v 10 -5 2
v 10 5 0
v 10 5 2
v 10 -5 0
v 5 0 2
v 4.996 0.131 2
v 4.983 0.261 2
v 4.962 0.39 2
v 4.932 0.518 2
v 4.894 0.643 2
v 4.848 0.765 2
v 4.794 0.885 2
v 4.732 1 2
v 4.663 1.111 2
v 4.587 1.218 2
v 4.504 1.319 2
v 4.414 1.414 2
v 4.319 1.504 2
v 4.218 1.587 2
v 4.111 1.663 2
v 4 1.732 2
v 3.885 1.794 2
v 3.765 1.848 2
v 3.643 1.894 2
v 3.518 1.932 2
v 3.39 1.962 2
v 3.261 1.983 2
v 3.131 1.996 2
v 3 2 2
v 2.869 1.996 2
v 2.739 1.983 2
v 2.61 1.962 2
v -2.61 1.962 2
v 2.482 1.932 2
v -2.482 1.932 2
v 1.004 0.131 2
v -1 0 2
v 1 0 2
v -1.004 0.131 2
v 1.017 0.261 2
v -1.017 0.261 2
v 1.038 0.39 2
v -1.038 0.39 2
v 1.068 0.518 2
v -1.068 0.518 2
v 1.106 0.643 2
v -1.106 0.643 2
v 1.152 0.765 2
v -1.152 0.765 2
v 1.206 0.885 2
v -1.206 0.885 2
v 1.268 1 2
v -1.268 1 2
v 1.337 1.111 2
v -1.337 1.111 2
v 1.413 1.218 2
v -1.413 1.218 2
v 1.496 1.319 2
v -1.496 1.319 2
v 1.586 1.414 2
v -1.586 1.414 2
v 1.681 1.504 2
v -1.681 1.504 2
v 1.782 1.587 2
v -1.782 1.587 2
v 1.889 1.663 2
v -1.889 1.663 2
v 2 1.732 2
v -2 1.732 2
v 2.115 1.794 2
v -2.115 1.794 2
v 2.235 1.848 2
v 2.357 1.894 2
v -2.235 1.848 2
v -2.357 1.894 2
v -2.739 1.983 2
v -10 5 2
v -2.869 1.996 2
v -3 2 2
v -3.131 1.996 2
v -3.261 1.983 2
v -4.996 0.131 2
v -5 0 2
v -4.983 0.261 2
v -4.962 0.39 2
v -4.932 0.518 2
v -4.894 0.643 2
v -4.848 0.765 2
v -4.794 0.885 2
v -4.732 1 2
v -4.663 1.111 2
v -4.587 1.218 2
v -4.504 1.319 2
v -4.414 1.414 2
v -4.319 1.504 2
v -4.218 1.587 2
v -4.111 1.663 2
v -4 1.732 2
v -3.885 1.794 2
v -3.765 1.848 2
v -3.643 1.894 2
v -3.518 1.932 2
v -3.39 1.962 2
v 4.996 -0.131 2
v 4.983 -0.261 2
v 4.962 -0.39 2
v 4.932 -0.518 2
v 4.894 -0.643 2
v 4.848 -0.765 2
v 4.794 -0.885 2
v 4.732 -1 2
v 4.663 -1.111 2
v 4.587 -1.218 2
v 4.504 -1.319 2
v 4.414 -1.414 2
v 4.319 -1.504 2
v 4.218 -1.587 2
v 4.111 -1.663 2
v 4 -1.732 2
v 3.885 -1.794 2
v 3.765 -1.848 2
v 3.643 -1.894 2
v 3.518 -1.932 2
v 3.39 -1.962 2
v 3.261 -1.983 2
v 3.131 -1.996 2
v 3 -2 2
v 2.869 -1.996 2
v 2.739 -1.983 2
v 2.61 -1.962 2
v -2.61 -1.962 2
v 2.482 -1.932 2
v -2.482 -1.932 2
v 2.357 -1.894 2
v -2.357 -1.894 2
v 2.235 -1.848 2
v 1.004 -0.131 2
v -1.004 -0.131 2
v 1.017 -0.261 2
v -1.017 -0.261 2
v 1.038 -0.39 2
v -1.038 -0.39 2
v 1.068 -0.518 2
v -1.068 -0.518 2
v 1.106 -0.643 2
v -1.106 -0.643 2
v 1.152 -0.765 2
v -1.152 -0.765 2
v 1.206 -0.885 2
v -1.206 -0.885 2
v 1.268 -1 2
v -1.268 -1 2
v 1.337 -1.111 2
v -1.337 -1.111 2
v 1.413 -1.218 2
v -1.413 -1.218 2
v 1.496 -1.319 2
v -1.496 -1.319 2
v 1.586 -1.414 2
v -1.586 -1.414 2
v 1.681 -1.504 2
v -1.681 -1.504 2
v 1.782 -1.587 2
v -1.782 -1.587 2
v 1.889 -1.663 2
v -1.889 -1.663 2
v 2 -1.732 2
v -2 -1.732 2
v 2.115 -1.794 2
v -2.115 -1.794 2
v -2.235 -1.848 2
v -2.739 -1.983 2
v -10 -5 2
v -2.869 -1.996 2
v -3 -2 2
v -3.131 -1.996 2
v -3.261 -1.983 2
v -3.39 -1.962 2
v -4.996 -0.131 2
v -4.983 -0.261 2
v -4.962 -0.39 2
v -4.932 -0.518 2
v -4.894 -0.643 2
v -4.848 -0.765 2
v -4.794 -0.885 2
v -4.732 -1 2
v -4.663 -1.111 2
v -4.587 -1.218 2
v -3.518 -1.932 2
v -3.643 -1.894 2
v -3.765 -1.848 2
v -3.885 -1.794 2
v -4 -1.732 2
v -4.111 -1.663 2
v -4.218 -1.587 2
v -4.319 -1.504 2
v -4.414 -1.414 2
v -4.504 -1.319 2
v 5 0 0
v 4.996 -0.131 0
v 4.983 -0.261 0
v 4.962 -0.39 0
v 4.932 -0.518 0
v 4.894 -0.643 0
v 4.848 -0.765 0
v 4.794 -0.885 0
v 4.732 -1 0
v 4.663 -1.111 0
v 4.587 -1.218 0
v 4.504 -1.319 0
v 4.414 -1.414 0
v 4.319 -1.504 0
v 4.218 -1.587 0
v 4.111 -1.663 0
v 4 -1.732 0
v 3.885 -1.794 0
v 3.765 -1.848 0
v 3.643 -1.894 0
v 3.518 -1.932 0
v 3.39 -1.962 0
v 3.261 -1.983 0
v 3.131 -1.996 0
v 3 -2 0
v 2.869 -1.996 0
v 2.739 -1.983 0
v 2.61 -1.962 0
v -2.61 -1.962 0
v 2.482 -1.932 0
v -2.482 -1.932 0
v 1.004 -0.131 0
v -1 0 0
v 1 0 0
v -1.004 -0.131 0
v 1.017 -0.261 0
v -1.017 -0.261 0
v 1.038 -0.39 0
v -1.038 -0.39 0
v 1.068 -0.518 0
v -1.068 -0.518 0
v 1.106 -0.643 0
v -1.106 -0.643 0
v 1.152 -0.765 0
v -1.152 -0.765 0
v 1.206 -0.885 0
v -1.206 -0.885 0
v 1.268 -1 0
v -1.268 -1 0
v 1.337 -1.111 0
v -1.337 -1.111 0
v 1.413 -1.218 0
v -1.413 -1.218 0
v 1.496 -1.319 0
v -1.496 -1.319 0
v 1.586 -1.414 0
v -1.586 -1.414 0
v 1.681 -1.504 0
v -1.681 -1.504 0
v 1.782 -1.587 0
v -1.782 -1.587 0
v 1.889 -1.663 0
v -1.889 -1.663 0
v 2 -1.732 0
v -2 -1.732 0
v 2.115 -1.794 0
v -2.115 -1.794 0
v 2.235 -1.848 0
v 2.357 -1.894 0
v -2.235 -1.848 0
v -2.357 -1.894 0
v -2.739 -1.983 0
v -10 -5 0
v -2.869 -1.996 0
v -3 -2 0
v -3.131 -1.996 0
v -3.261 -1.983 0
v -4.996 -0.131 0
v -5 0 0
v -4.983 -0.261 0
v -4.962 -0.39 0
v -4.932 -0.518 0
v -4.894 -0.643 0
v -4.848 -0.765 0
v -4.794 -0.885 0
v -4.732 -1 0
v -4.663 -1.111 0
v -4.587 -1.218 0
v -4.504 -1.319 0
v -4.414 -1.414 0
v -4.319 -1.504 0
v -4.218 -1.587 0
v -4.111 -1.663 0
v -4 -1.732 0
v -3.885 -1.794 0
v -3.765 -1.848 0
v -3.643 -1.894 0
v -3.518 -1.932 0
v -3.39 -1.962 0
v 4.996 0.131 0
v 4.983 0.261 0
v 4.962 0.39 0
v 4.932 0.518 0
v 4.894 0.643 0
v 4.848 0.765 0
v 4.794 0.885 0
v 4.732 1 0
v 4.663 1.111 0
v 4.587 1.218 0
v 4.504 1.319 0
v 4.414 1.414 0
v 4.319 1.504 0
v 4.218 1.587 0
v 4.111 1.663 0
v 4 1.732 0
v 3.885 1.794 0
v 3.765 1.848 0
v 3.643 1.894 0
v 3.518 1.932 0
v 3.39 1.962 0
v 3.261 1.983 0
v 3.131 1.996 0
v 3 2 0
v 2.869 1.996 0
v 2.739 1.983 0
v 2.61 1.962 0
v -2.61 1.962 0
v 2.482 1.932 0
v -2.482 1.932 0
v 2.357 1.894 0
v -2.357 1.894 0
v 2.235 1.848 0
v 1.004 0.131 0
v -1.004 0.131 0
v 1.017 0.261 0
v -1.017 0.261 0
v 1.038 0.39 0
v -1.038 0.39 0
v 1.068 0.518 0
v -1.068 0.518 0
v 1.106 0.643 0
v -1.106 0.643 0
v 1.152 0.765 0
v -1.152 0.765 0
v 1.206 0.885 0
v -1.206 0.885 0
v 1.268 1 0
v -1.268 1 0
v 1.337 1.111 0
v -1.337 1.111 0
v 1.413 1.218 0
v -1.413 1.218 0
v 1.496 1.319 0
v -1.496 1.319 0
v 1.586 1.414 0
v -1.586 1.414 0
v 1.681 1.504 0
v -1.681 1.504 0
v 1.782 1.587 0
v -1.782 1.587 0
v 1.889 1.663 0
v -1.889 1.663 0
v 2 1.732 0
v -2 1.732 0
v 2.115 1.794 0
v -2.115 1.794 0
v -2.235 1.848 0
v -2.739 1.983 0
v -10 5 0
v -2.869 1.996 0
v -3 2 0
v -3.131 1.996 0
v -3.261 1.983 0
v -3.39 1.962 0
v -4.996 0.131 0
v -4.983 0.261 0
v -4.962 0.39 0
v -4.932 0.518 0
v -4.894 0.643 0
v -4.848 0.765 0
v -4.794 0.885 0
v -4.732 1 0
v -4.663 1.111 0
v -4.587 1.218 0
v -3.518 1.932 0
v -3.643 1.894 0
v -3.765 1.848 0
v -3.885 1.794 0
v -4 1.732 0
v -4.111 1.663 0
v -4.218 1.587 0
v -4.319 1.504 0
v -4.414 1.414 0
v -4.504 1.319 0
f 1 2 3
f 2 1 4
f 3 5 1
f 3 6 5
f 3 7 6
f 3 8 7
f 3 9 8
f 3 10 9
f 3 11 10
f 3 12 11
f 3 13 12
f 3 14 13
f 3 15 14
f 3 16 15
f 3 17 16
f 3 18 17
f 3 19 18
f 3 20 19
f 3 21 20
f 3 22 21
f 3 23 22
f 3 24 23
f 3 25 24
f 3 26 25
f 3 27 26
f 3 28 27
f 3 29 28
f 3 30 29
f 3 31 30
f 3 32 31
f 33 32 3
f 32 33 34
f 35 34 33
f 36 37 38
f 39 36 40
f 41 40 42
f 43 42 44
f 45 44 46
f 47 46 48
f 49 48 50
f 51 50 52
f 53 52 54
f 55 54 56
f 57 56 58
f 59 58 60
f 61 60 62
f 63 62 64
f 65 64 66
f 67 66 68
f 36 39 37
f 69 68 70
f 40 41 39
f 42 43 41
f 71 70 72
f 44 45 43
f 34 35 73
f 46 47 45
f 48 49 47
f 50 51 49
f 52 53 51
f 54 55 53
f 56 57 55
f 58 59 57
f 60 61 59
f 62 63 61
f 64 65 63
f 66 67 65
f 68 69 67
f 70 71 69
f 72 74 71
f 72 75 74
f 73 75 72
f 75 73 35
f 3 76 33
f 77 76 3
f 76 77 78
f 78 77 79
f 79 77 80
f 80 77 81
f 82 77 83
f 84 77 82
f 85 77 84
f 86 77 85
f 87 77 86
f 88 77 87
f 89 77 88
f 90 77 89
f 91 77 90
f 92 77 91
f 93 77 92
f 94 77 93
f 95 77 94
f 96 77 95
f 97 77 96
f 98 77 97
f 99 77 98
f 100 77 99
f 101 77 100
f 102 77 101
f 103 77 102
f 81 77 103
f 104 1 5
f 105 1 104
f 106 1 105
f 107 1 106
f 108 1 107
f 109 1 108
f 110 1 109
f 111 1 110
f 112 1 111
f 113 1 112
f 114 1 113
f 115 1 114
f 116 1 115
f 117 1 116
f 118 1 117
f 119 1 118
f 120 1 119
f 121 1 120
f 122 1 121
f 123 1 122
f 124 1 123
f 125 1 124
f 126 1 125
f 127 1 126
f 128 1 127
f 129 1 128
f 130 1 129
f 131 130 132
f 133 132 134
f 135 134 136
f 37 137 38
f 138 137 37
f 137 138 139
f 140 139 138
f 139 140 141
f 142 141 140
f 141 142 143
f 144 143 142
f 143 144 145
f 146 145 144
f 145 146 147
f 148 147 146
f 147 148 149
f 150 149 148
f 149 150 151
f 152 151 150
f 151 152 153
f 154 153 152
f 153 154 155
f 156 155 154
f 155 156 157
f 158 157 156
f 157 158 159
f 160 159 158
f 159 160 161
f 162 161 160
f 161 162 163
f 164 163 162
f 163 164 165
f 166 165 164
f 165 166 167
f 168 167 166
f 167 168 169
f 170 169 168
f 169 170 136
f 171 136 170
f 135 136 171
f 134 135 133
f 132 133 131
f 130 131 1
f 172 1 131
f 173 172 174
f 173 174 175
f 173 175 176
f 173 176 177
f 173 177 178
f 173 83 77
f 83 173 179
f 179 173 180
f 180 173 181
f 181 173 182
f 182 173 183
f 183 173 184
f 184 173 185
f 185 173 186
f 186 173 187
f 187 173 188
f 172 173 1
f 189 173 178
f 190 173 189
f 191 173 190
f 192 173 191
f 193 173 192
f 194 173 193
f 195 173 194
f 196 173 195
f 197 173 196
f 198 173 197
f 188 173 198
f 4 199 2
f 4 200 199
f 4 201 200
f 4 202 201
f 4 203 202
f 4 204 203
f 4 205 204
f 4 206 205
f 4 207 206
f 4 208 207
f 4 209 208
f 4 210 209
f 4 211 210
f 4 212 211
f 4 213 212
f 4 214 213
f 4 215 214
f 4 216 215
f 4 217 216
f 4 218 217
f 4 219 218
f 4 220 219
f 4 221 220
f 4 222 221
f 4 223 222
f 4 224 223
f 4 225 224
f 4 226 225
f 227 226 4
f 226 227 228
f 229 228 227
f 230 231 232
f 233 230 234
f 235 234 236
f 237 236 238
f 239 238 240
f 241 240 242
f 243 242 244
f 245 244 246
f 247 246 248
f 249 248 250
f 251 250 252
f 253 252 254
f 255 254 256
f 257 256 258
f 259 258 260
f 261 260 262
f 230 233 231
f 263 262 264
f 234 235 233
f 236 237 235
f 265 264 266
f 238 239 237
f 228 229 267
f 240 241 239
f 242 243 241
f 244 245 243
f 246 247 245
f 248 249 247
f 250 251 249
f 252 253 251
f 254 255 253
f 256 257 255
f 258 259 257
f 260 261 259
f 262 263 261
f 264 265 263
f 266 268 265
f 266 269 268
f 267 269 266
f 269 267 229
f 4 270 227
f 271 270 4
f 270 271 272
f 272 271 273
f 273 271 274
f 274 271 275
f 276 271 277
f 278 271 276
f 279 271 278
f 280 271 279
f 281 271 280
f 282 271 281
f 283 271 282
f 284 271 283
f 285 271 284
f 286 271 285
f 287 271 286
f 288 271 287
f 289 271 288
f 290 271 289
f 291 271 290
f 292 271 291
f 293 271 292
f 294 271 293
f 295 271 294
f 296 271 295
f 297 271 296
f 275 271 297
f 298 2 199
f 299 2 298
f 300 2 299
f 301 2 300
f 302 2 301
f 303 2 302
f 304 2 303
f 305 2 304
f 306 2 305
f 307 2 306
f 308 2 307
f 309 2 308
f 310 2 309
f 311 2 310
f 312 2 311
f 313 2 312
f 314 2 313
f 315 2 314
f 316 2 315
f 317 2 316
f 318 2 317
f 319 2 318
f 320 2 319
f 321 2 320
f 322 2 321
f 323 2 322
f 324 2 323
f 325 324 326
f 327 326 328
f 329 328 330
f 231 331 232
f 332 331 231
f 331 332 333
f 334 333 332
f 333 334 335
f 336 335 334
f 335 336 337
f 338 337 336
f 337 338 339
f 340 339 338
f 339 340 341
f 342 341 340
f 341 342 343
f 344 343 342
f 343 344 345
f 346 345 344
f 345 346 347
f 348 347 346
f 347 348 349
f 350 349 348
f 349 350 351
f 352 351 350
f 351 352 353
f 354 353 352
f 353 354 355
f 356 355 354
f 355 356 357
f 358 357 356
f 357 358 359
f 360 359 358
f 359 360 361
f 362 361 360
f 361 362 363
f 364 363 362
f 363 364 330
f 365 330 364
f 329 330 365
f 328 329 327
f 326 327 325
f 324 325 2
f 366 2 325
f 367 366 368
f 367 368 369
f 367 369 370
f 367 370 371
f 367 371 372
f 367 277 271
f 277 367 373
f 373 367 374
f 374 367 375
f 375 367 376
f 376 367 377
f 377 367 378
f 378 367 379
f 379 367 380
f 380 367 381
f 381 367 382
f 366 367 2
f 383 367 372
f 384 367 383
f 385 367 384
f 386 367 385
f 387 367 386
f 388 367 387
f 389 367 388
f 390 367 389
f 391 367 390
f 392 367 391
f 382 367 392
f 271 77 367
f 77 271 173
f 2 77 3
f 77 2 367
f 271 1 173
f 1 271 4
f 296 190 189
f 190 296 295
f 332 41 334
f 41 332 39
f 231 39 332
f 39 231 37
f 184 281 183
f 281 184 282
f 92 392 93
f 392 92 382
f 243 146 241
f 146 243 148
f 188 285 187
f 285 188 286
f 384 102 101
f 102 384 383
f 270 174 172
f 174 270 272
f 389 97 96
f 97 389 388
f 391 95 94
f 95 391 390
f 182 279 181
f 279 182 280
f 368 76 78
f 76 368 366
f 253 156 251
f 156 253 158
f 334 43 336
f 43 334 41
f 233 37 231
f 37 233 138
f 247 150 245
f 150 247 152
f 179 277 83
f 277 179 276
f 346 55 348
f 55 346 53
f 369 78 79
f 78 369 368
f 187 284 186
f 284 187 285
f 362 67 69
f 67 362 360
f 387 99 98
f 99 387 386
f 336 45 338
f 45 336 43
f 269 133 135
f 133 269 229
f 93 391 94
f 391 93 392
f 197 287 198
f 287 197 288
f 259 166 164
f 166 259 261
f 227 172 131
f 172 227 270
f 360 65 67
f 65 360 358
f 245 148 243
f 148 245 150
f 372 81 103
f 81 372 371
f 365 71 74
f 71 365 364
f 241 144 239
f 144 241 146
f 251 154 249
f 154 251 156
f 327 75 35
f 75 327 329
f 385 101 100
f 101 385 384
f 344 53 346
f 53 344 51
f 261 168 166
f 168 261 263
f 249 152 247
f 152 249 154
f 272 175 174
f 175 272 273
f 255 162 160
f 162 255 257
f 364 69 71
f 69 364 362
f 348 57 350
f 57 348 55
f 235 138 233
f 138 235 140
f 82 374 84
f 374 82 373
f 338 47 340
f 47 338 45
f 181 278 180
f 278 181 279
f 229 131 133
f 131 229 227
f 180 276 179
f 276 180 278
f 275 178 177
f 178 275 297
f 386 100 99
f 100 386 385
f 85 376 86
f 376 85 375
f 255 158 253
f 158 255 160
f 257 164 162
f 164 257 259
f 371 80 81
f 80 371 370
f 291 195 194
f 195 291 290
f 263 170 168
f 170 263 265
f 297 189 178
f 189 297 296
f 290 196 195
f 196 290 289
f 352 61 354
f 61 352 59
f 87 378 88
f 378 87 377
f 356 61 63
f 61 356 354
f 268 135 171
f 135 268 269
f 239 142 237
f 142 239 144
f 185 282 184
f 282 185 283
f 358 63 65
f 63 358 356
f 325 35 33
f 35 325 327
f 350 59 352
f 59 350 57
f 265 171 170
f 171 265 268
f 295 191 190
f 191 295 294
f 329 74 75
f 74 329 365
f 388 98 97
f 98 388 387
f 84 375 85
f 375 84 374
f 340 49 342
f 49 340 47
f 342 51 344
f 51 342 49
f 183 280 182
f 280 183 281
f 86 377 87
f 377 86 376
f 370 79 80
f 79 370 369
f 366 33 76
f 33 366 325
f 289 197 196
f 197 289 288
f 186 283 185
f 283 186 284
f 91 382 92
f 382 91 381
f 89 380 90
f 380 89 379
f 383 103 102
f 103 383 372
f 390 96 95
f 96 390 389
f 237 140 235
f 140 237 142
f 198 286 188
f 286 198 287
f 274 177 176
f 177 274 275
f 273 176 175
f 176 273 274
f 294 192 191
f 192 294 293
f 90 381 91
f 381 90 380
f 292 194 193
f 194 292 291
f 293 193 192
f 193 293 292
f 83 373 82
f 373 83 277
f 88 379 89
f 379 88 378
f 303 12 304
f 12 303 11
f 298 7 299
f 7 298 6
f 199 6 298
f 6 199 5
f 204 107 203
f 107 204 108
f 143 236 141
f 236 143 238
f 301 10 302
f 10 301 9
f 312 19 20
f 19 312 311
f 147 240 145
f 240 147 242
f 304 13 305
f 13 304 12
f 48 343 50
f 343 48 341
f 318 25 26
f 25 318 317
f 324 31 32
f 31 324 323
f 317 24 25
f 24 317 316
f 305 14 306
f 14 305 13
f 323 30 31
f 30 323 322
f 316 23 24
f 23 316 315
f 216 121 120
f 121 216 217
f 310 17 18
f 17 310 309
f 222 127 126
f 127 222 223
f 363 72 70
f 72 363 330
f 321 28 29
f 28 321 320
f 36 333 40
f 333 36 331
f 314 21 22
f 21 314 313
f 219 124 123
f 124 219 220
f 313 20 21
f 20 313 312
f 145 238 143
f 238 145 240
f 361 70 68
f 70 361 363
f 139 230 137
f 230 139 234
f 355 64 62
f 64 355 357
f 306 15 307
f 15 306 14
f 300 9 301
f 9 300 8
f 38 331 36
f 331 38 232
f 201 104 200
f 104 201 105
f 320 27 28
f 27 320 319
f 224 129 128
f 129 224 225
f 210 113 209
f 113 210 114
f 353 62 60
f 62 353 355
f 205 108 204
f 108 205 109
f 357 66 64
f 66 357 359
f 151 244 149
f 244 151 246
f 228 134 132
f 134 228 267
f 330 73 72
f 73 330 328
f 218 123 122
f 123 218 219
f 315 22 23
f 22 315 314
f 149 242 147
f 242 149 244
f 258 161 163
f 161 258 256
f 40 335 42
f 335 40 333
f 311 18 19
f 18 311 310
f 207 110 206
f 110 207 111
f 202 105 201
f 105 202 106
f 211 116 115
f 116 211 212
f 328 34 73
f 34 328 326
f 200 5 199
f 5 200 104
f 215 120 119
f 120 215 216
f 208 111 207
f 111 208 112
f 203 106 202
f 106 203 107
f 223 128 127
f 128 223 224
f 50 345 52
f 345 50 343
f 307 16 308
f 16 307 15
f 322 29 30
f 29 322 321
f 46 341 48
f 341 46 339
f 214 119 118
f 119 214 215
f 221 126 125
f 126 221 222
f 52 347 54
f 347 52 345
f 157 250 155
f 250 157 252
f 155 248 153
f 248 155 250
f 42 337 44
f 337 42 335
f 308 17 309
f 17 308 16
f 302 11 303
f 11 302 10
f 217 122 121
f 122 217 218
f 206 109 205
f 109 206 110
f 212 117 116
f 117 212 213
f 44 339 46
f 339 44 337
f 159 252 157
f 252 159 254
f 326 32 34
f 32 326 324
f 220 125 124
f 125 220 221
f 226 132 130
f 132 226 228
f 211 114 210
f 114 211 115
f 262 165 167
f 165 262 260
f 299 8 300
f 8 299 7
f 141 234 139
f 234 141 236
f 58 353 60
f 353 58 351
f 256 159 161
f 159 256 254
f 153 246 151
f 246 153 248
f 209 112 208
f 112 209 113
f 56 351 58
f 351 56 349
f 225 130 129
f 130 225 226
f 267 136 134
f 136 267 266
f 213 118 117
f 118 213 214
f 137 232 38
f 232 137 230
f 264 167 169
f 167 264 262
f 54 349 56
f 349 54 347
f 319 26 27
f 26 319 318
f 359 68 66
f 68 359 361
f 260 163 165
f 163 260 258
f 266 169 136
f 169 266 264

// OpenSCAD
// Auto-generated from tests/data/feature_fixtures_manifest.json
// fixture: plate_linear_two_holes
// fixture_type: plate
// description: Simple two-hole plate used as the baseline linear pattern case.
$fn = 96;

plate_size = [20.000000, 10.000000, 2.000000];
plate_origin = [-10.000000, -5.000000, 0.000000];

module through_hole(center, diameter, height) {
  translate(center) cylinder(d=diameter, h=height, center=false);
}

module through_slot(start, end, width, height) {
  hull() {
    through_hole(start, width, height);
    through_hole(end, width, height);
  }
}

module counterbore_hole(center, through_d, bore_d, bore_depth, height) {
  translate(center) cylinder(d=through_d, h=height, center=false);
  translate([center[0], center[1], center[2] + height - bore_depth])
    cylinder(d=bore_d, h=bore_depth + 0.1, center=false);
}

difference() {
  translate(plate_origin) cube(plate_size);
  through_hole([-3.000000, 0.000000, -0.100000], 4.000000, 2.200000);  // hole_0
  through_hole([3.000000, 0.000000, -0.100000], 4.000000, 2.200000);  // hole_1
}
